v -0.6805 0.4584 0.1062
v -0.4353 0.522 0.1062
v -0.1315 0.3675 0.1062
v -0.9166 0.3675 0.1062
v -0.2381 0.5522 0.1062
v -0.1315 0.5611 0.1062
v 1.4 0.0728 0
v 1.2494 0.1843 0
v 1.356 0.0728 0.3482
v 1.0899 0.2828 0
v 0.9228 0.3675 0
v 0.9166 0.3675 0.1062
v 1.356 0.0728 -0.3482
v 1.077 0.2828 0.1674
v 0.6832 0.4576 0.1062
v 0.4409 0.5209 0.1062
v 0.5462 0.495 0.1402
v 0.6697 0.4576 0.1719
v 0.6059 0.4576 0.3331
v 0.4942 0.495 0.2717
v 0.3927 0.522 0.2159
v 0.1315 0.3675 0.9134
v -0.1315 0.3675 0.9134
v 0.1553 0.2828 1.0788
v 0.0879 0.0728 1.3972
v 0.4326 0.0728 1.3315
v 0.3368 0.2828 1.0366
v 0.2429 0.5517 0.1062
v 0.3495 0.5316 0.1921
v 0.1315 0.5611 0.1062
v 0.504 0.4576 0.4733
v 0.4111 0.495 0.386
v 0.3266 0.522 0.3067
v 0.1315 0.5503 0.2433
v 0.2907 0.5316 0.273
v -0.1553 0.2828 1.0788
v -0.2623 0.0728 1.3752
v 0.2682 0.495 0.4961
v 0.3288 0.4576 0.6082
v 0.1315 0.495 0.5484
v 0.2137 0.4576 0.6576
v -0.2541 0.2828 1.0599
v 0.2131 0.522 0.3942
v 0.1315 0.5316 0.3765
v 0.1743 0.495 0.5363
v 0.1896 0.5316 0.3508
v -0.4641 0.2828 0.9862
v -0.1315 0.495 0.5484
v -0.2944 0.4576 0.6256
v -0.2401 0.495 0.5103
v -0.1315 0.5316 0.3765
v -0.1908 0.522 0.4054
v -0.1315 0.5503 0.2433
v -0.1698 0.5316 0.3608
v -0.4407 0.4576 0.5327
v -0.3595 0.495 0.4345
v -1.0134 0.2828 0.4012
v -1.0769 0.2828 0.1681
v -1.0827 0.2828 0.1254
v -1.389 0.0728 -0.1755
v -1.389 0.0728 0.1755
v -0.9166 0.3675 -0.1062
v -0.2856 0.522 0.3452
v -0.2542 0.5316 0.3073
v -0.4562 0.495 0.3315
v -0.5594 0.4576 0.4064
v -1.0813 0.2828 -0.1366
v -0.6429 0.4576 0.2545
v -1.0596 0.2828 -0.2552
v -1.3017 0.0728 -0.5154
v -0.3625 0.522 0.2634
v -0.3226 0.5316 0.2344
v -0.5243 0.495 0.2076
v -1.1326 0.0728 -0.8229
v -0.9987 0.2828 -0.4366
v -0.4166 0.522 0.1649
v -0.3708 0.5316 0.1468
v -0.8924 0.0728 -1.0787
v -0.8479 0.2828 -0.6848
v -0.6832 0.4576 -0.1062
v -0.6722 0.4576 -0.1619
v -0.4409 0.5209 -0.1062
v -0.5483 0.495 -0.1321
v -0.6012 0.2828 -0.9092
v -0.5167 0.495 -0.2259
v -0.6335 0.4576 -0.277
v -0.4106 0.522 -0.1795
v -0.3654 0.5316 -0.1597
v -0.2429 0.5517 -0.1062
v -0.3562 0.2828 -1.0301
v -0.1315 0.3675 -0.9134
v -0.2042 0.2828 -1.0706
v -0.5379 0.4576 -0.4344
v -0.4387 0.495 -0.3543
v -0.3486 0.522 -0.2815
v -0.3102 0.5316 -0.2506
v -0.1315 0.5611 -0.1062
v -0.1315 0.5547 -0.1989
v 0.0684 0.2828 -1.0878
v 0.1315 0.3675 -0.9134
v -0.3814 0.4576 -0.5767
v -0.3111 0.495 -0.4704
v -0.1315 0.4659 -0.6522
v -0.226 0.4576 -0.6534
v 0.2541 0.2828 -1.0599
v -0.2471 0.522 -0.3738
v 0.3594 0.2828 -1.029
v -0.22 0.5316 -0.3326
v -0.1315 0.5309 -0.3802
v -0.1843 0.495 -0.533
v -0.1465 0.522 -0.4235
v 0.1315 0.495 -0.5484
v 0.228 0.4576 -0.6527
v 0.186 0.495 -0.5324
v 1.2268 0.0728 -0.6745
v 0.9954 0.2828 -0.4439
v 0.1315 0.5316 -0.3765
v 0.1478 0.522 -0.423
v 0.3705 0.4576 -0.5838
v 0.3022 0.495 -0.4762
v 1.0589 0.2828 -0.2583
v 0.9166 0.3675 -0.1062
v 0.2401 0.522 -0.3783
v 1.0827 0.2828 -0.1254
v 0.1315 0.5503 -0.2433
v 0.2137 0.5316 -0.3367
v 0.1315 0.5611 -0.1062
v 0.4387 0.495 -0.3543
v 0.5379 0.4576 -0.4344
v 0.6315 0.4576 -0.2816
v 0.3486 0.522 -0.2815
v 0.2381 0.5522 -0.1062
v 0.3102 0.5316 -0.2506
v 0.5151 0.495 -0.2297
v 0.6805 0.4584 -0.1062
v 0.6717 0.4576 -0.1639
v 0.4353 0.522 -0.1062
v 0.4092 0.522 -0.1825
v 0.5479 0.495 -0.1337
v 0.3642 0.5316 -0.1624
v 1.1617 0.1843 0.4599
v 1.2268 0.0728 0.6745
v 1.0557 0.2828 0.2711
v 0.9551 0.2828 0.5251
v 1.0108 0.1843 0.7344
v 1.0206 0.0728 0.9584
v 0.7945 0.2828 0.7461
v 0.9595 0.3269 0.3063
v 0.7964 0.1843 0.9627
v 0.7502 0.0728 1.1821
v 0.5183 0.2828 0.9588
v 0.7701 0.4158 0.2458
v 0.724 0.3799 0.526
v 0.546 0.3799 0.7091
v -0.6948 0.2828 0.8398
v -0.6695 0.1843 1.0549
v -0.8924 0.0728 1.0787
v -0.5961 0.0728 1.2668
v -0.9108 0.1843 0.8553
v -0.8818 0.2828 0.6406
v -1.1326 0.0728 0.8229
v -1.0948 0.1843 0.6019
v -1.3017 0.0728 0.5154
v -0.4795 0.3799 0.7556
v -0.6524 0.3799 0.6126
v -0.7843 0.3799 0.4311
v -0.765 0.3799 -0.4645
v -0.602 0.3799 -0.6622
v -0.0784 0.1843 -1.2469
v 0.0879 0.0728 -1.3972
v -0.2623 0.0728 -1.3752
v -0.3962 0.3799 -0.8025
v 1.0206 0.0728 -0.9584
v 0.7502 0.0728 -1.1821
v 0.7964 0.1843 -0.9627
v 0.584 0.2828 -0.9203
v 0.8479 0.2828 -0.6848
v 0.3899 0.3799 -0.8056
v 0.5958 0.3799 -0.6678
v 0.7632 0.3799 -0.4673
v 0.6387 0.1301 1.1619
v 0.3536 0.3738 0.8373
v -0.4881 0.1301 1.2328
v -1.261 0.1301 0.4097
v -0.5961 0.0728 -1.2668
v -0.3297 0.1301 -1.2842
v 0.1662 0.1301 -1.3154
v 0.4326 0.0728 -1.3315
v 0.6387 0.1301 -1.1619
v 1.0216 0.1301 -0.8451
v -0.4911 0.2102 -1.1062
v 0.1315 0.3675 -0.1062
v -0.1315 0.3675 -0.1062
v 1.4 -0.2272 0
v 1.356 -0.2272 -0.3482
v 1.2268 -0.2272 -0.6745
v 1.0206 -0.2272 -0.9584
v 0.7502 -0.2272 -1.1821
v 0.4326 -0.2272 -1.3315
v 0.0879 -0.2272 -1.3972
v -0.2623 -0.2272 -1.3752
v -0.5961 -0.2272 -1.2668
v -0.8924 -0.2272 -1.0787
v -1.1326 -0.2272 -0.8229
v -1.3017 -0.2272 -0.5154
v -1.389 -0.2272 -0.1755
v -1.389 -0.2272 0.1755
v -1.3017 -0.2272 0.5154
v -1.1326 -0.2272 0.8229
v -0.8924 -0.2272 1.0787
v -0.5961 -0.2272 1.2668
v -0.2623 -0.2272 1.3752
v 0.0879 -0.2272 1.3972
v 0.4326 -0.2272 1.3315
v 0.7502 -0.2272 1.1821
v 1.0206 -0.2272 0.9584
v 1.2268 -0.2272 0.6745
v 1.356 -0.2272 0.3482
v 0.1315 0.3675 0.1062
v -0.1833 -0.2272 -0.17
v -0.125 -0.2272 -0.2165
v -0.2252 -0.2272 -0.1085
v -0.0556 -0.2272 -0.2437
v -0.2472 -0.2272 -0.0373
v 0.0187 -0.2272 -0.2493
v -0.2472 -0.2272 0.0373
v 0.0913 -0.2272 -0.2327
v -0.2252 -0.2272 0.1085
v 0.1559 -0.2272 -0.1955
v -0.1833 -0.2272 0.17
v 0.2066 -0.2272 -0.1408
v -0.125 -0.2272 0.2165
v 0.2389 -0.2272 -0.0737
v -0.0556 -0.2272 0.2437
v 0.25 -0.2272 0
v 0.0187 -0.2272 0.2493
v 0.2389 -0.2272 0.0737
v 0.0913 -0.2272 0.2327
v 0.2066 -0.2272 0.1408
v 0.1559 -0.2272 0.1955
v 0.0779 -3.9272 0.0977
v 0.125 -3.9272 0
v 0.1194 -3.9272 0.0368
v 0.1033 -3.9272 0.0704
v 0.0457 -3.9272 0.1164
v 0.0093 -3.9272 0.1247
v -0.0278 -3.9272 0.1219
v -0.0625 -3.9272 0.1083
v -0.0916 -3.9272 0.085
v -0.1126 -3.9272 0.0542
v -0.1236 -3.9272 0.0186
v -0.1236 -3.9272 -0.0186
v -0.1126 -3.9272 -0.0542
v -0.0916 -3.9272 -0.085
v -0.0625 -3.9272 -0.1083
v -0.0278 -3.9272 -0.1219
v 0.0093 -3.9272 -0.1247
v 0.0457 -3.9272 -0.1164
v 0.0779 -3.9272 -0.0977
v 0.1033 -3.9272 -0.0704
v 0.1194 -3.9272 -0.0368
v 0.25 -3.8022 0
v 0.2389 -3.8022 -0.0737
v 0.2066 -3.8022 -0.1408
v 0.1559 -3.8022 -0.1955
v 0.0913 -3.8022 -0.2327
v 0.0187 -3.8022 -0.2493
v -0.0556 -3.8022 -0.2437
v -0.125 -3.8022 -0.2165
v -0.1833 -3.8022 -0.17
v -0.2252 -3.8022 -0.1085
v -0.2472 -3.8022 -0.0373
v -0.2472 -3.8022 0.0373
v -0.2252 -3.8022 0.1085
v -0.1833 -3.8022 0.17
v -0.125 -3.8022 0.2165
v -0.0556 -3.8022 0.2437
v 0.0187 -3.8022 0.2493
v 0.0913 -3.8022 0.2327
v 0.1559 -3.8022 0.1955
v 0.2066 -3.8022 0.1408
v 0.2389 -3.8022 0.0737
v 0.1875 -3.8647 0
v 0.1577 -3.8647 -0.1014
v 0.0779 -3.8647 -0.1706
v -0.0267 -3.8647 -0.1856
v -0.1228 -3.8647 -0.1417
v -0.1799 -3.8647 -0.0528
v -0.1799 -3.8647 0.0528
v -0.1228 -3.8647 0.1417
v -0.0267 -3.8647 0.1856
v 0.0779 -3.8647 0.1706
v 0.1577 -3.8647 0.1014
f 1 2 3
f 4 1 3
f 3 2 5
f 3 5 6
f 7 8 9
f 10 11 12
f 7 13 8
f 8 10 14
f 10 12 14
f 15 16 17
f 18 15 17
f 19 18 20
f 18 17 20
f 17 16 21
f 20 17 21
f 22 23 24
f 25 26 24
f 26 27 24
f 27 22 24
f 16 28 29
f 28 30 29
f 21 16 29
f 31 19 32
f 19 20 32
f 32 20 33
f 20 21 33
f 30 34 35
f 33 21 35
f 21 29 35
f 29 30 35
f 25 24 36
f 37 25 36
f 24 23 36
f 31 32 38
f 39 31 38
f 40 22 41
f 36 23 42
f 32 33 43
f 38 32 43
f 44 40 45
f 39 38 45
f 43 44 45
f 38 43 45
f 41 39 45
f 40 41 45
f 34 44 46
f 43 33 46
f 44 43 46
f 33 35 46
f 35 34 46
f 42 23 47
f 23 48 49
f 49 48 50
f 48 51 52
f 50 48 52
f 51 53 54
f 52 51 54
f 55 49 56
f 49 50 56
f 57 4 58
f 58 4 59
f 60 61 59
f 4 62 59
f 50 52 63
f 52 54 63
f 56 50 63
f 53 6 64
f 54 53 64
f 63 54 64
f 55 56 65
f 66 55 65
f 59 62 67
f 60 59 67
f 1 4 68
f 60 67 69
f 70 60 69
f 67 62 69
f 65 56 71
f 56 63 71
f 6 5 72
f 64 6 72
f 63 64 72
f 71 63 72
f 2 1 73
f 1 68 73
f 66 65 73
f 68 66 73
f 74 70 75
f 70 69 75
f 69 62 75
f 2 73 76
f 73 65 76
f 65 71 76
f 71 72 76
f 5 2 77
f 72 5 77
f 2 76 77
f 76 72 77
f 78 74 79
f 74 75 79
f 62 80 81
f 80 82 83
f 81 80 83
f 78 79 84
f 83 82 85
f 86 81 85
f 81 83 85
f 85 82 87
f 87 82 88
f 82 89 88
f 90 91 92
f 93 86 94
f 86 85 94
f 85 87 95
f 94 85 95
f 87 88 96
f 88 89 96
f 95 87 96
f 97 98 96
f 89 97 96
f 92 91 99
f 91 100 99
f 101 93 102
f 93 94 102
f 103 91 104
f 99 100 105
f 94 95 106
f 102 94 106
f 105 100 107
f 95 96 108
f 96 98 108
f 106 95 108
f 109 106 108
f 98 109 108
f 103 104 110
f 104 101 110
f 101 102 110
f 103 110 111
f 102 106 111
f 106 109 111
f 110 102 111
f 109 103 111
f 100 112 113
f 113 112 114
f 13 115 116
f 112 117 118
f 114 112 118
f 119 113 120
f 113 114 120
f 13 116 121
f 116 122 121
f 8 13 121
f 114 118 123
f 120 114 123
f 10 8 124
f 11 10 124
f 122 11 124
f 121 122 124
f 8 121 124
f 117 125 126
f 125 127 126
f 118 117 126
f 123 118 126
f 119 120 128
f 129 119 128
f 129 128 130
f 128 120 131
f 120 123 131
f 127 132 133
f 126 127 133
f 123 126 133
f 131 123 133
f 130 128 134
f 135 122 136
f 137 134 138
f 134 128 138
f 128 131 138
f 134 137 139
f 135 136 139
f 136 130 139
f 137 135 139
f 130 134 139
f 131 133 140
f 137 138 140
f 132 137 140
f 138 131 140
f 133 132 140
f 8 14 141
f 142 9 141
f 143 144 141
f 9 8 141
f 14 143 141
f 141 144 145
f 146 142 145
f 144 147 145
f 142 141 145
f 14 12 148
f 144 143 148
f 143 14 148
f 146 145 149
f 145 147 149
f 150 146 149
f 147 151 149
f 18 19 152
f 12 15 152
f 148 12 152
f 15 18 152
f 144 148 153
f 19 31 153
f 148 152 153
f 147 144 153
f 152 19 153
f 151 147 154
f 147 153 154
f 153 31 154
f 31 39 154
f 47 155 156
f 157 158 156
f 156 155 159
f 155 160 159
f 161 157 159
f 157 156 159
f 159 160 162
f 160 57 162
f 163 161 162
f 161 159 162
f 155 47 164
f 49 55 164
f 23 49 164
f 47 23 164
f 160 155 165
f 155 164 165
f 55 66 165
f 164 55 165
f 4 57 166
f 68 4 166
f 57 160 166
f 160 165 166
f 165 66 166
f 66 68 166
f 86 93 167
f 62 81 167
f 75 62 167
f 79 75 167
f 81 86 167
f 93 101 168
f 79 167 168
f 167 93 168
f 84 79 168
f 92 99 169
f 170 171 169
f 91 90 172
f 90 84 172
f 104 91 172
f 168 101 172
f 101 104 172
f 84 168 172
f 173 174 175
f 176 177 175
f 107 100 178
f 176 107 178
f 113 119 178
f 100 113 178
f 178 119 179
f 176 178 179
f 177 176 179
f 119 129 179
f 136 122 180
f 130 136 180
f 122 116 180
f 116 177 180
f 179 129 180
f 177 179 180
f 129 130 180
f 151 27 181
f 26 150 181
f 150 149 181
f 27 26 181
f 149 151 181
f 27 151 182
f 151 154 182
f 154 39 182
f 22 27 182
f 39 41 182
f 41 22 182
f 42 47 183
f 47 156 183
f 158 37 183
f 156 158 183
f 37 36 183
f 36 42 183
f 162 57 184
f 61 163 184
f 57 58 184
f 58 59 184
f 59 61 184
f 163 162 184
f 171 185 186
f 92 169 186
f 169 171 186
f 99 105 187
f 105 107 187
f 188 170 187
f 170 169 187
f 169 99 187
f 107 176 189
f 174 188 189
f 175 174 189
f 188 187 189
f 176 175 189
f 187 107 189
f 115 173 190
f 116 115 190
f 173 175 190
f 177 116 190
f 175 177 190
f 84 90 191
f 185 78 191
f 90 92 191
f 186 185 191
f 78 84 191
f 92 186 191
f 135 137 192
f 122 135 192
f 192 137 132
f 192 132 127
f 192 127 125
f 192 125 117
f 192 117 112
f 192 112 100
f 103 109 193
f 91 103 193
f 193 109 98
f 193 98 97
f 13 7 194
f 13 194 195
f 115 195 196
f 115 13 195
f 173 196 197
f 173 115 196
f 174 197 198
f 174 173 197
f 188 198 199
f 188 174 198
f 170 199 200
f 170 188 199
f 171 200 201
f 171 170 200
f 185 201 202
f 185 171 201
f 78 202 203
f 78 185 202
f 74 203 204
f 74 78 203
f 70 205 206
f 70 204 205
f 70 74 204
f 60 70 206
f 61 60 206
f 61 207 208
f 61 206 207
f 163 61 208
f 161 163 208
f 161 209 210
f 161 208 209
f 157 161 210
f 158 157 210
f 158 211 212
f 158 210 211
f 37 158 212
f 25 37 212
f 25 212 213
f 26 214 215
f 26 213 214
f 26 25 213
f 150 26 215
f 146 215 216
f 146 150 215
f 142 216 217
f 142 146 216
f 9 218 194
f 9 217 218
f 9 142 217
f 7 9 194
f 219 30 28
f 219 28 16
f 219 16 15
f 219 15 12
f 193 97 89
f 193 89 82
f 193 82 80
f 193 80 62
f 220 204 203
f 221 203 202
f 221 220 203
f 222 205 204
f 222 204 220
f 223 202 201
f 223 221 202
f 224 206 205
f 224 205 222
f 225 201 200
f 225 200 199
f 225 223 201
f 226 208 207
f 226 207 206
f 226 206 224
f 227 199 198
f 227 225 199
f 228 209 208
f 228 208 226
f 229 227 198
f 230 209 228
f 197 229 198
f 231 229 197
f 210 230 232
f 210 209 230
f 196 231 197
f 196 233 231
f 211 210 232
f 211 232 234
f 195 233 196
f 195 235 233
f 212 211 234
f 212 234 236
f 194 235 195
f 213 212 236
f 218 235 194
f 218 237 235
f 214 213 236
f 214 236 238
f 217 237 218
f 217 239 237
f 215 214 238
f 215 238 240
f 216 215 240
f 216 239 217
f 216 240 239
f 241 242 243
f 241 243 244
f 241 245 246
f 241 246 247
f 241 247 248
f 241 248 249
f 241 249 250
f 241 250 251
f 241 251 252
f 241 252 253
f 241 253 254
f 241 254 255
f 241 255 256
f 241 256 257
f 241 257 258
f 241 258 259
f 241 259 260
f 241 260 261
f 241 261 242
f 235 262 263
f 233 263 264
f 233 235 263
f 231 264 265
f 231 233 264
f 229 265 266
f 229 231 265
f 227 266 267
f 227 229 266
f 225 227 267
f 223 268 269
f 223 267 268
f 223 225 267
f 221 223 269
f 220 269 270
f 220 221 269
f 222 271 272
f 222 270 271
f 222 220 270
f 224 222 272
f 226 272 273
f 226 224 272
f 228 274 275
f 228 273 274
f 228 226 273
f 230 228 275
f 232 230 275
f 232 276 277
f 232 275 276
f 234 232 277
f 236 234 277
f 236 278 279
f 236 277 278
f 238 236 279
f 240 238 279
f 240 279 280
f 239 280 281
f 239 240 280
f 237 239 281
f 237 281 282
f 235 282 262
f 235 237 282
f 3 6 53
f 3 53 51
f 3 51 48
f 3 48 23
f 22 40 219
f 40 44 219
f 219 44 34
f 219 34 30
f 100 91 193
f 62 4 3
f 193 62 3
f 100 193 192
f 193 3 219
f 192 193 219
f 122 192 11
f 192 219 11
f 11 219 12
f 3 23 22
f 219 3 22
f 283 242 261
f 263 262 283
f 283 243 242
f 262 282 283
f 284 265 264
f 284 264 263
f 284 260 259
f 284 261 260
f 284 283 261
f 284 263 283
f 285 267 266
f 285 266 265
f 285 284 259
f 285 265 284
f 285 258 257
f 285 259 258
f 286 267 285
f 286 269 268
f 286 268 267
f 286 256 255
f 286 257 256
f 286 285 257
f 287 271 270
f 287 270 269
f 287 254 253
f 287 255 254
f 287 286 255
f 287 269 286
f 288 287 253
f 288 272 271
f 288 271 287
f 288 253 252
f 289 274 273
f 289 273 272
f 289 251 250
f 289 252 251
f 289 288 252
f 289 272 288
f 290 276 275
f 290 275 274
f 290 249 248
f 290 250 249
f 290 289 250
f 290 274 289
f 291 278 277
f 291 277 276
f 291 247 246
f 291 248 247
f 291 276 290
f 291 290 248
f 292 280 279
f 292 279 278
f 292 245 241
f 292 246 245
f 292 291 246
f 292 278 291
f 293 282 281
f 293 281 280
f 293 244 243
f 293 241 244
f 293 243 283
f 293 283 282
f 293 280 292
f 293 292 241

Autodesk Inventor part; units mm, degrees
ref_plane "YZ Plane" through (0, 0, 0) normal (1, 0, 0) x (0, 1, 0)
ref_plane "XZ Plane" through (0, 0, 0) normal (0, 1, 0) x (-1, 0, 0)
sketch "草圖1" plane through (0, 0, 0) normal (0, 0, 1) x (1, 0, 0)
  arc A0 (1.4, 0.0728) -> (0, 0.5675) centre (0, -1.6606) ccw
  line L0 (0, 1.1572) -> (0, -2.1303) projected
  line L1 (0, 0.0728) -> (0, 0.5675)
  line L2 (0, 0.0728) -> (1.4, 0.0728)
  dimension "d11" = 1.4
revolve "迴轉1" add sketch "草圖1" angle 360 about axis through (0, 0, 0) along (0, -1, 0)
ref_plane "工作平面1" through (0, 0.5675, 0) normal (0, -1, 0) x (1, 0, 0)
sketch "草圖2" plane through (0, 0.5675, 0) normal (0, -1, 0) x (1, 0, 0)
  line L0 (-2.9128, 0.1062) -> (2.9128, 0.1062)
  line L1 (2.9128, 0.1062) -> (2.9128, -0.1062)
  line L2 (2.9128, -0.1062) -> (-2.9128, -0.1062)
  line L3 (-2.9128, -0.1062) -> (-2.9128, 0.1062)
  line L4 (-2.9128, 0.1062) -> (2.9128, -0.1062) construction
  line L5 (2.9128, 0.1062) -> (-2.9128, -0.1062) construction
  line L6 (-0.1315, 2.5627) -> (0.1315, 2.5627)
  line L7 (0.1315, 2.5627) -> (0.1315, -2.5627)
  line L8 (0.1315, -2.5627) -> (-0.1315, -2.5627)
  line L9 (-0.1315, -2.5627) -> (-0.1315, 2.5627)
  line L10 (-0.1315, 2.5627) -> (0.1315, -2.5627) construction
  line L11 (0.1315, 2.5627) -> (-0.1315, -2.5627) construction
  point P0 (0, 0)
extrude "擠出1" cut sketch "草圖2" along normal blind 0.2
sketch "草圖3" plane through (0, 0.0728, 0) normal (0, -1, 0) x (1, 0, 0)
  circle A0 centre (0, 0) radius 0.25
  dimension "d10" = 0.5
extrude "擠出2" add sketch "草圖3" along normal blind 4
chamfer "倒角1" distance 0.125 angle 45 1 edges at (-0.25, -3.9272, 0)
sketch "草圖4" plane through (0, 0.0728, 0) normal (0, -1, 0) x (1, 0, 0)
  circle A0 centre (0, 0) radius 0.25 projected
  circle A1 centre (0, 0) radius 1.4 projected
extrude "擠出3" add sketch "草圖4" along normal blind 0.3 contours A0 | A1
thread "螺紋2" size "M0.5x0.125" class "6g" standard "ANSI Metric M Profile" full length
